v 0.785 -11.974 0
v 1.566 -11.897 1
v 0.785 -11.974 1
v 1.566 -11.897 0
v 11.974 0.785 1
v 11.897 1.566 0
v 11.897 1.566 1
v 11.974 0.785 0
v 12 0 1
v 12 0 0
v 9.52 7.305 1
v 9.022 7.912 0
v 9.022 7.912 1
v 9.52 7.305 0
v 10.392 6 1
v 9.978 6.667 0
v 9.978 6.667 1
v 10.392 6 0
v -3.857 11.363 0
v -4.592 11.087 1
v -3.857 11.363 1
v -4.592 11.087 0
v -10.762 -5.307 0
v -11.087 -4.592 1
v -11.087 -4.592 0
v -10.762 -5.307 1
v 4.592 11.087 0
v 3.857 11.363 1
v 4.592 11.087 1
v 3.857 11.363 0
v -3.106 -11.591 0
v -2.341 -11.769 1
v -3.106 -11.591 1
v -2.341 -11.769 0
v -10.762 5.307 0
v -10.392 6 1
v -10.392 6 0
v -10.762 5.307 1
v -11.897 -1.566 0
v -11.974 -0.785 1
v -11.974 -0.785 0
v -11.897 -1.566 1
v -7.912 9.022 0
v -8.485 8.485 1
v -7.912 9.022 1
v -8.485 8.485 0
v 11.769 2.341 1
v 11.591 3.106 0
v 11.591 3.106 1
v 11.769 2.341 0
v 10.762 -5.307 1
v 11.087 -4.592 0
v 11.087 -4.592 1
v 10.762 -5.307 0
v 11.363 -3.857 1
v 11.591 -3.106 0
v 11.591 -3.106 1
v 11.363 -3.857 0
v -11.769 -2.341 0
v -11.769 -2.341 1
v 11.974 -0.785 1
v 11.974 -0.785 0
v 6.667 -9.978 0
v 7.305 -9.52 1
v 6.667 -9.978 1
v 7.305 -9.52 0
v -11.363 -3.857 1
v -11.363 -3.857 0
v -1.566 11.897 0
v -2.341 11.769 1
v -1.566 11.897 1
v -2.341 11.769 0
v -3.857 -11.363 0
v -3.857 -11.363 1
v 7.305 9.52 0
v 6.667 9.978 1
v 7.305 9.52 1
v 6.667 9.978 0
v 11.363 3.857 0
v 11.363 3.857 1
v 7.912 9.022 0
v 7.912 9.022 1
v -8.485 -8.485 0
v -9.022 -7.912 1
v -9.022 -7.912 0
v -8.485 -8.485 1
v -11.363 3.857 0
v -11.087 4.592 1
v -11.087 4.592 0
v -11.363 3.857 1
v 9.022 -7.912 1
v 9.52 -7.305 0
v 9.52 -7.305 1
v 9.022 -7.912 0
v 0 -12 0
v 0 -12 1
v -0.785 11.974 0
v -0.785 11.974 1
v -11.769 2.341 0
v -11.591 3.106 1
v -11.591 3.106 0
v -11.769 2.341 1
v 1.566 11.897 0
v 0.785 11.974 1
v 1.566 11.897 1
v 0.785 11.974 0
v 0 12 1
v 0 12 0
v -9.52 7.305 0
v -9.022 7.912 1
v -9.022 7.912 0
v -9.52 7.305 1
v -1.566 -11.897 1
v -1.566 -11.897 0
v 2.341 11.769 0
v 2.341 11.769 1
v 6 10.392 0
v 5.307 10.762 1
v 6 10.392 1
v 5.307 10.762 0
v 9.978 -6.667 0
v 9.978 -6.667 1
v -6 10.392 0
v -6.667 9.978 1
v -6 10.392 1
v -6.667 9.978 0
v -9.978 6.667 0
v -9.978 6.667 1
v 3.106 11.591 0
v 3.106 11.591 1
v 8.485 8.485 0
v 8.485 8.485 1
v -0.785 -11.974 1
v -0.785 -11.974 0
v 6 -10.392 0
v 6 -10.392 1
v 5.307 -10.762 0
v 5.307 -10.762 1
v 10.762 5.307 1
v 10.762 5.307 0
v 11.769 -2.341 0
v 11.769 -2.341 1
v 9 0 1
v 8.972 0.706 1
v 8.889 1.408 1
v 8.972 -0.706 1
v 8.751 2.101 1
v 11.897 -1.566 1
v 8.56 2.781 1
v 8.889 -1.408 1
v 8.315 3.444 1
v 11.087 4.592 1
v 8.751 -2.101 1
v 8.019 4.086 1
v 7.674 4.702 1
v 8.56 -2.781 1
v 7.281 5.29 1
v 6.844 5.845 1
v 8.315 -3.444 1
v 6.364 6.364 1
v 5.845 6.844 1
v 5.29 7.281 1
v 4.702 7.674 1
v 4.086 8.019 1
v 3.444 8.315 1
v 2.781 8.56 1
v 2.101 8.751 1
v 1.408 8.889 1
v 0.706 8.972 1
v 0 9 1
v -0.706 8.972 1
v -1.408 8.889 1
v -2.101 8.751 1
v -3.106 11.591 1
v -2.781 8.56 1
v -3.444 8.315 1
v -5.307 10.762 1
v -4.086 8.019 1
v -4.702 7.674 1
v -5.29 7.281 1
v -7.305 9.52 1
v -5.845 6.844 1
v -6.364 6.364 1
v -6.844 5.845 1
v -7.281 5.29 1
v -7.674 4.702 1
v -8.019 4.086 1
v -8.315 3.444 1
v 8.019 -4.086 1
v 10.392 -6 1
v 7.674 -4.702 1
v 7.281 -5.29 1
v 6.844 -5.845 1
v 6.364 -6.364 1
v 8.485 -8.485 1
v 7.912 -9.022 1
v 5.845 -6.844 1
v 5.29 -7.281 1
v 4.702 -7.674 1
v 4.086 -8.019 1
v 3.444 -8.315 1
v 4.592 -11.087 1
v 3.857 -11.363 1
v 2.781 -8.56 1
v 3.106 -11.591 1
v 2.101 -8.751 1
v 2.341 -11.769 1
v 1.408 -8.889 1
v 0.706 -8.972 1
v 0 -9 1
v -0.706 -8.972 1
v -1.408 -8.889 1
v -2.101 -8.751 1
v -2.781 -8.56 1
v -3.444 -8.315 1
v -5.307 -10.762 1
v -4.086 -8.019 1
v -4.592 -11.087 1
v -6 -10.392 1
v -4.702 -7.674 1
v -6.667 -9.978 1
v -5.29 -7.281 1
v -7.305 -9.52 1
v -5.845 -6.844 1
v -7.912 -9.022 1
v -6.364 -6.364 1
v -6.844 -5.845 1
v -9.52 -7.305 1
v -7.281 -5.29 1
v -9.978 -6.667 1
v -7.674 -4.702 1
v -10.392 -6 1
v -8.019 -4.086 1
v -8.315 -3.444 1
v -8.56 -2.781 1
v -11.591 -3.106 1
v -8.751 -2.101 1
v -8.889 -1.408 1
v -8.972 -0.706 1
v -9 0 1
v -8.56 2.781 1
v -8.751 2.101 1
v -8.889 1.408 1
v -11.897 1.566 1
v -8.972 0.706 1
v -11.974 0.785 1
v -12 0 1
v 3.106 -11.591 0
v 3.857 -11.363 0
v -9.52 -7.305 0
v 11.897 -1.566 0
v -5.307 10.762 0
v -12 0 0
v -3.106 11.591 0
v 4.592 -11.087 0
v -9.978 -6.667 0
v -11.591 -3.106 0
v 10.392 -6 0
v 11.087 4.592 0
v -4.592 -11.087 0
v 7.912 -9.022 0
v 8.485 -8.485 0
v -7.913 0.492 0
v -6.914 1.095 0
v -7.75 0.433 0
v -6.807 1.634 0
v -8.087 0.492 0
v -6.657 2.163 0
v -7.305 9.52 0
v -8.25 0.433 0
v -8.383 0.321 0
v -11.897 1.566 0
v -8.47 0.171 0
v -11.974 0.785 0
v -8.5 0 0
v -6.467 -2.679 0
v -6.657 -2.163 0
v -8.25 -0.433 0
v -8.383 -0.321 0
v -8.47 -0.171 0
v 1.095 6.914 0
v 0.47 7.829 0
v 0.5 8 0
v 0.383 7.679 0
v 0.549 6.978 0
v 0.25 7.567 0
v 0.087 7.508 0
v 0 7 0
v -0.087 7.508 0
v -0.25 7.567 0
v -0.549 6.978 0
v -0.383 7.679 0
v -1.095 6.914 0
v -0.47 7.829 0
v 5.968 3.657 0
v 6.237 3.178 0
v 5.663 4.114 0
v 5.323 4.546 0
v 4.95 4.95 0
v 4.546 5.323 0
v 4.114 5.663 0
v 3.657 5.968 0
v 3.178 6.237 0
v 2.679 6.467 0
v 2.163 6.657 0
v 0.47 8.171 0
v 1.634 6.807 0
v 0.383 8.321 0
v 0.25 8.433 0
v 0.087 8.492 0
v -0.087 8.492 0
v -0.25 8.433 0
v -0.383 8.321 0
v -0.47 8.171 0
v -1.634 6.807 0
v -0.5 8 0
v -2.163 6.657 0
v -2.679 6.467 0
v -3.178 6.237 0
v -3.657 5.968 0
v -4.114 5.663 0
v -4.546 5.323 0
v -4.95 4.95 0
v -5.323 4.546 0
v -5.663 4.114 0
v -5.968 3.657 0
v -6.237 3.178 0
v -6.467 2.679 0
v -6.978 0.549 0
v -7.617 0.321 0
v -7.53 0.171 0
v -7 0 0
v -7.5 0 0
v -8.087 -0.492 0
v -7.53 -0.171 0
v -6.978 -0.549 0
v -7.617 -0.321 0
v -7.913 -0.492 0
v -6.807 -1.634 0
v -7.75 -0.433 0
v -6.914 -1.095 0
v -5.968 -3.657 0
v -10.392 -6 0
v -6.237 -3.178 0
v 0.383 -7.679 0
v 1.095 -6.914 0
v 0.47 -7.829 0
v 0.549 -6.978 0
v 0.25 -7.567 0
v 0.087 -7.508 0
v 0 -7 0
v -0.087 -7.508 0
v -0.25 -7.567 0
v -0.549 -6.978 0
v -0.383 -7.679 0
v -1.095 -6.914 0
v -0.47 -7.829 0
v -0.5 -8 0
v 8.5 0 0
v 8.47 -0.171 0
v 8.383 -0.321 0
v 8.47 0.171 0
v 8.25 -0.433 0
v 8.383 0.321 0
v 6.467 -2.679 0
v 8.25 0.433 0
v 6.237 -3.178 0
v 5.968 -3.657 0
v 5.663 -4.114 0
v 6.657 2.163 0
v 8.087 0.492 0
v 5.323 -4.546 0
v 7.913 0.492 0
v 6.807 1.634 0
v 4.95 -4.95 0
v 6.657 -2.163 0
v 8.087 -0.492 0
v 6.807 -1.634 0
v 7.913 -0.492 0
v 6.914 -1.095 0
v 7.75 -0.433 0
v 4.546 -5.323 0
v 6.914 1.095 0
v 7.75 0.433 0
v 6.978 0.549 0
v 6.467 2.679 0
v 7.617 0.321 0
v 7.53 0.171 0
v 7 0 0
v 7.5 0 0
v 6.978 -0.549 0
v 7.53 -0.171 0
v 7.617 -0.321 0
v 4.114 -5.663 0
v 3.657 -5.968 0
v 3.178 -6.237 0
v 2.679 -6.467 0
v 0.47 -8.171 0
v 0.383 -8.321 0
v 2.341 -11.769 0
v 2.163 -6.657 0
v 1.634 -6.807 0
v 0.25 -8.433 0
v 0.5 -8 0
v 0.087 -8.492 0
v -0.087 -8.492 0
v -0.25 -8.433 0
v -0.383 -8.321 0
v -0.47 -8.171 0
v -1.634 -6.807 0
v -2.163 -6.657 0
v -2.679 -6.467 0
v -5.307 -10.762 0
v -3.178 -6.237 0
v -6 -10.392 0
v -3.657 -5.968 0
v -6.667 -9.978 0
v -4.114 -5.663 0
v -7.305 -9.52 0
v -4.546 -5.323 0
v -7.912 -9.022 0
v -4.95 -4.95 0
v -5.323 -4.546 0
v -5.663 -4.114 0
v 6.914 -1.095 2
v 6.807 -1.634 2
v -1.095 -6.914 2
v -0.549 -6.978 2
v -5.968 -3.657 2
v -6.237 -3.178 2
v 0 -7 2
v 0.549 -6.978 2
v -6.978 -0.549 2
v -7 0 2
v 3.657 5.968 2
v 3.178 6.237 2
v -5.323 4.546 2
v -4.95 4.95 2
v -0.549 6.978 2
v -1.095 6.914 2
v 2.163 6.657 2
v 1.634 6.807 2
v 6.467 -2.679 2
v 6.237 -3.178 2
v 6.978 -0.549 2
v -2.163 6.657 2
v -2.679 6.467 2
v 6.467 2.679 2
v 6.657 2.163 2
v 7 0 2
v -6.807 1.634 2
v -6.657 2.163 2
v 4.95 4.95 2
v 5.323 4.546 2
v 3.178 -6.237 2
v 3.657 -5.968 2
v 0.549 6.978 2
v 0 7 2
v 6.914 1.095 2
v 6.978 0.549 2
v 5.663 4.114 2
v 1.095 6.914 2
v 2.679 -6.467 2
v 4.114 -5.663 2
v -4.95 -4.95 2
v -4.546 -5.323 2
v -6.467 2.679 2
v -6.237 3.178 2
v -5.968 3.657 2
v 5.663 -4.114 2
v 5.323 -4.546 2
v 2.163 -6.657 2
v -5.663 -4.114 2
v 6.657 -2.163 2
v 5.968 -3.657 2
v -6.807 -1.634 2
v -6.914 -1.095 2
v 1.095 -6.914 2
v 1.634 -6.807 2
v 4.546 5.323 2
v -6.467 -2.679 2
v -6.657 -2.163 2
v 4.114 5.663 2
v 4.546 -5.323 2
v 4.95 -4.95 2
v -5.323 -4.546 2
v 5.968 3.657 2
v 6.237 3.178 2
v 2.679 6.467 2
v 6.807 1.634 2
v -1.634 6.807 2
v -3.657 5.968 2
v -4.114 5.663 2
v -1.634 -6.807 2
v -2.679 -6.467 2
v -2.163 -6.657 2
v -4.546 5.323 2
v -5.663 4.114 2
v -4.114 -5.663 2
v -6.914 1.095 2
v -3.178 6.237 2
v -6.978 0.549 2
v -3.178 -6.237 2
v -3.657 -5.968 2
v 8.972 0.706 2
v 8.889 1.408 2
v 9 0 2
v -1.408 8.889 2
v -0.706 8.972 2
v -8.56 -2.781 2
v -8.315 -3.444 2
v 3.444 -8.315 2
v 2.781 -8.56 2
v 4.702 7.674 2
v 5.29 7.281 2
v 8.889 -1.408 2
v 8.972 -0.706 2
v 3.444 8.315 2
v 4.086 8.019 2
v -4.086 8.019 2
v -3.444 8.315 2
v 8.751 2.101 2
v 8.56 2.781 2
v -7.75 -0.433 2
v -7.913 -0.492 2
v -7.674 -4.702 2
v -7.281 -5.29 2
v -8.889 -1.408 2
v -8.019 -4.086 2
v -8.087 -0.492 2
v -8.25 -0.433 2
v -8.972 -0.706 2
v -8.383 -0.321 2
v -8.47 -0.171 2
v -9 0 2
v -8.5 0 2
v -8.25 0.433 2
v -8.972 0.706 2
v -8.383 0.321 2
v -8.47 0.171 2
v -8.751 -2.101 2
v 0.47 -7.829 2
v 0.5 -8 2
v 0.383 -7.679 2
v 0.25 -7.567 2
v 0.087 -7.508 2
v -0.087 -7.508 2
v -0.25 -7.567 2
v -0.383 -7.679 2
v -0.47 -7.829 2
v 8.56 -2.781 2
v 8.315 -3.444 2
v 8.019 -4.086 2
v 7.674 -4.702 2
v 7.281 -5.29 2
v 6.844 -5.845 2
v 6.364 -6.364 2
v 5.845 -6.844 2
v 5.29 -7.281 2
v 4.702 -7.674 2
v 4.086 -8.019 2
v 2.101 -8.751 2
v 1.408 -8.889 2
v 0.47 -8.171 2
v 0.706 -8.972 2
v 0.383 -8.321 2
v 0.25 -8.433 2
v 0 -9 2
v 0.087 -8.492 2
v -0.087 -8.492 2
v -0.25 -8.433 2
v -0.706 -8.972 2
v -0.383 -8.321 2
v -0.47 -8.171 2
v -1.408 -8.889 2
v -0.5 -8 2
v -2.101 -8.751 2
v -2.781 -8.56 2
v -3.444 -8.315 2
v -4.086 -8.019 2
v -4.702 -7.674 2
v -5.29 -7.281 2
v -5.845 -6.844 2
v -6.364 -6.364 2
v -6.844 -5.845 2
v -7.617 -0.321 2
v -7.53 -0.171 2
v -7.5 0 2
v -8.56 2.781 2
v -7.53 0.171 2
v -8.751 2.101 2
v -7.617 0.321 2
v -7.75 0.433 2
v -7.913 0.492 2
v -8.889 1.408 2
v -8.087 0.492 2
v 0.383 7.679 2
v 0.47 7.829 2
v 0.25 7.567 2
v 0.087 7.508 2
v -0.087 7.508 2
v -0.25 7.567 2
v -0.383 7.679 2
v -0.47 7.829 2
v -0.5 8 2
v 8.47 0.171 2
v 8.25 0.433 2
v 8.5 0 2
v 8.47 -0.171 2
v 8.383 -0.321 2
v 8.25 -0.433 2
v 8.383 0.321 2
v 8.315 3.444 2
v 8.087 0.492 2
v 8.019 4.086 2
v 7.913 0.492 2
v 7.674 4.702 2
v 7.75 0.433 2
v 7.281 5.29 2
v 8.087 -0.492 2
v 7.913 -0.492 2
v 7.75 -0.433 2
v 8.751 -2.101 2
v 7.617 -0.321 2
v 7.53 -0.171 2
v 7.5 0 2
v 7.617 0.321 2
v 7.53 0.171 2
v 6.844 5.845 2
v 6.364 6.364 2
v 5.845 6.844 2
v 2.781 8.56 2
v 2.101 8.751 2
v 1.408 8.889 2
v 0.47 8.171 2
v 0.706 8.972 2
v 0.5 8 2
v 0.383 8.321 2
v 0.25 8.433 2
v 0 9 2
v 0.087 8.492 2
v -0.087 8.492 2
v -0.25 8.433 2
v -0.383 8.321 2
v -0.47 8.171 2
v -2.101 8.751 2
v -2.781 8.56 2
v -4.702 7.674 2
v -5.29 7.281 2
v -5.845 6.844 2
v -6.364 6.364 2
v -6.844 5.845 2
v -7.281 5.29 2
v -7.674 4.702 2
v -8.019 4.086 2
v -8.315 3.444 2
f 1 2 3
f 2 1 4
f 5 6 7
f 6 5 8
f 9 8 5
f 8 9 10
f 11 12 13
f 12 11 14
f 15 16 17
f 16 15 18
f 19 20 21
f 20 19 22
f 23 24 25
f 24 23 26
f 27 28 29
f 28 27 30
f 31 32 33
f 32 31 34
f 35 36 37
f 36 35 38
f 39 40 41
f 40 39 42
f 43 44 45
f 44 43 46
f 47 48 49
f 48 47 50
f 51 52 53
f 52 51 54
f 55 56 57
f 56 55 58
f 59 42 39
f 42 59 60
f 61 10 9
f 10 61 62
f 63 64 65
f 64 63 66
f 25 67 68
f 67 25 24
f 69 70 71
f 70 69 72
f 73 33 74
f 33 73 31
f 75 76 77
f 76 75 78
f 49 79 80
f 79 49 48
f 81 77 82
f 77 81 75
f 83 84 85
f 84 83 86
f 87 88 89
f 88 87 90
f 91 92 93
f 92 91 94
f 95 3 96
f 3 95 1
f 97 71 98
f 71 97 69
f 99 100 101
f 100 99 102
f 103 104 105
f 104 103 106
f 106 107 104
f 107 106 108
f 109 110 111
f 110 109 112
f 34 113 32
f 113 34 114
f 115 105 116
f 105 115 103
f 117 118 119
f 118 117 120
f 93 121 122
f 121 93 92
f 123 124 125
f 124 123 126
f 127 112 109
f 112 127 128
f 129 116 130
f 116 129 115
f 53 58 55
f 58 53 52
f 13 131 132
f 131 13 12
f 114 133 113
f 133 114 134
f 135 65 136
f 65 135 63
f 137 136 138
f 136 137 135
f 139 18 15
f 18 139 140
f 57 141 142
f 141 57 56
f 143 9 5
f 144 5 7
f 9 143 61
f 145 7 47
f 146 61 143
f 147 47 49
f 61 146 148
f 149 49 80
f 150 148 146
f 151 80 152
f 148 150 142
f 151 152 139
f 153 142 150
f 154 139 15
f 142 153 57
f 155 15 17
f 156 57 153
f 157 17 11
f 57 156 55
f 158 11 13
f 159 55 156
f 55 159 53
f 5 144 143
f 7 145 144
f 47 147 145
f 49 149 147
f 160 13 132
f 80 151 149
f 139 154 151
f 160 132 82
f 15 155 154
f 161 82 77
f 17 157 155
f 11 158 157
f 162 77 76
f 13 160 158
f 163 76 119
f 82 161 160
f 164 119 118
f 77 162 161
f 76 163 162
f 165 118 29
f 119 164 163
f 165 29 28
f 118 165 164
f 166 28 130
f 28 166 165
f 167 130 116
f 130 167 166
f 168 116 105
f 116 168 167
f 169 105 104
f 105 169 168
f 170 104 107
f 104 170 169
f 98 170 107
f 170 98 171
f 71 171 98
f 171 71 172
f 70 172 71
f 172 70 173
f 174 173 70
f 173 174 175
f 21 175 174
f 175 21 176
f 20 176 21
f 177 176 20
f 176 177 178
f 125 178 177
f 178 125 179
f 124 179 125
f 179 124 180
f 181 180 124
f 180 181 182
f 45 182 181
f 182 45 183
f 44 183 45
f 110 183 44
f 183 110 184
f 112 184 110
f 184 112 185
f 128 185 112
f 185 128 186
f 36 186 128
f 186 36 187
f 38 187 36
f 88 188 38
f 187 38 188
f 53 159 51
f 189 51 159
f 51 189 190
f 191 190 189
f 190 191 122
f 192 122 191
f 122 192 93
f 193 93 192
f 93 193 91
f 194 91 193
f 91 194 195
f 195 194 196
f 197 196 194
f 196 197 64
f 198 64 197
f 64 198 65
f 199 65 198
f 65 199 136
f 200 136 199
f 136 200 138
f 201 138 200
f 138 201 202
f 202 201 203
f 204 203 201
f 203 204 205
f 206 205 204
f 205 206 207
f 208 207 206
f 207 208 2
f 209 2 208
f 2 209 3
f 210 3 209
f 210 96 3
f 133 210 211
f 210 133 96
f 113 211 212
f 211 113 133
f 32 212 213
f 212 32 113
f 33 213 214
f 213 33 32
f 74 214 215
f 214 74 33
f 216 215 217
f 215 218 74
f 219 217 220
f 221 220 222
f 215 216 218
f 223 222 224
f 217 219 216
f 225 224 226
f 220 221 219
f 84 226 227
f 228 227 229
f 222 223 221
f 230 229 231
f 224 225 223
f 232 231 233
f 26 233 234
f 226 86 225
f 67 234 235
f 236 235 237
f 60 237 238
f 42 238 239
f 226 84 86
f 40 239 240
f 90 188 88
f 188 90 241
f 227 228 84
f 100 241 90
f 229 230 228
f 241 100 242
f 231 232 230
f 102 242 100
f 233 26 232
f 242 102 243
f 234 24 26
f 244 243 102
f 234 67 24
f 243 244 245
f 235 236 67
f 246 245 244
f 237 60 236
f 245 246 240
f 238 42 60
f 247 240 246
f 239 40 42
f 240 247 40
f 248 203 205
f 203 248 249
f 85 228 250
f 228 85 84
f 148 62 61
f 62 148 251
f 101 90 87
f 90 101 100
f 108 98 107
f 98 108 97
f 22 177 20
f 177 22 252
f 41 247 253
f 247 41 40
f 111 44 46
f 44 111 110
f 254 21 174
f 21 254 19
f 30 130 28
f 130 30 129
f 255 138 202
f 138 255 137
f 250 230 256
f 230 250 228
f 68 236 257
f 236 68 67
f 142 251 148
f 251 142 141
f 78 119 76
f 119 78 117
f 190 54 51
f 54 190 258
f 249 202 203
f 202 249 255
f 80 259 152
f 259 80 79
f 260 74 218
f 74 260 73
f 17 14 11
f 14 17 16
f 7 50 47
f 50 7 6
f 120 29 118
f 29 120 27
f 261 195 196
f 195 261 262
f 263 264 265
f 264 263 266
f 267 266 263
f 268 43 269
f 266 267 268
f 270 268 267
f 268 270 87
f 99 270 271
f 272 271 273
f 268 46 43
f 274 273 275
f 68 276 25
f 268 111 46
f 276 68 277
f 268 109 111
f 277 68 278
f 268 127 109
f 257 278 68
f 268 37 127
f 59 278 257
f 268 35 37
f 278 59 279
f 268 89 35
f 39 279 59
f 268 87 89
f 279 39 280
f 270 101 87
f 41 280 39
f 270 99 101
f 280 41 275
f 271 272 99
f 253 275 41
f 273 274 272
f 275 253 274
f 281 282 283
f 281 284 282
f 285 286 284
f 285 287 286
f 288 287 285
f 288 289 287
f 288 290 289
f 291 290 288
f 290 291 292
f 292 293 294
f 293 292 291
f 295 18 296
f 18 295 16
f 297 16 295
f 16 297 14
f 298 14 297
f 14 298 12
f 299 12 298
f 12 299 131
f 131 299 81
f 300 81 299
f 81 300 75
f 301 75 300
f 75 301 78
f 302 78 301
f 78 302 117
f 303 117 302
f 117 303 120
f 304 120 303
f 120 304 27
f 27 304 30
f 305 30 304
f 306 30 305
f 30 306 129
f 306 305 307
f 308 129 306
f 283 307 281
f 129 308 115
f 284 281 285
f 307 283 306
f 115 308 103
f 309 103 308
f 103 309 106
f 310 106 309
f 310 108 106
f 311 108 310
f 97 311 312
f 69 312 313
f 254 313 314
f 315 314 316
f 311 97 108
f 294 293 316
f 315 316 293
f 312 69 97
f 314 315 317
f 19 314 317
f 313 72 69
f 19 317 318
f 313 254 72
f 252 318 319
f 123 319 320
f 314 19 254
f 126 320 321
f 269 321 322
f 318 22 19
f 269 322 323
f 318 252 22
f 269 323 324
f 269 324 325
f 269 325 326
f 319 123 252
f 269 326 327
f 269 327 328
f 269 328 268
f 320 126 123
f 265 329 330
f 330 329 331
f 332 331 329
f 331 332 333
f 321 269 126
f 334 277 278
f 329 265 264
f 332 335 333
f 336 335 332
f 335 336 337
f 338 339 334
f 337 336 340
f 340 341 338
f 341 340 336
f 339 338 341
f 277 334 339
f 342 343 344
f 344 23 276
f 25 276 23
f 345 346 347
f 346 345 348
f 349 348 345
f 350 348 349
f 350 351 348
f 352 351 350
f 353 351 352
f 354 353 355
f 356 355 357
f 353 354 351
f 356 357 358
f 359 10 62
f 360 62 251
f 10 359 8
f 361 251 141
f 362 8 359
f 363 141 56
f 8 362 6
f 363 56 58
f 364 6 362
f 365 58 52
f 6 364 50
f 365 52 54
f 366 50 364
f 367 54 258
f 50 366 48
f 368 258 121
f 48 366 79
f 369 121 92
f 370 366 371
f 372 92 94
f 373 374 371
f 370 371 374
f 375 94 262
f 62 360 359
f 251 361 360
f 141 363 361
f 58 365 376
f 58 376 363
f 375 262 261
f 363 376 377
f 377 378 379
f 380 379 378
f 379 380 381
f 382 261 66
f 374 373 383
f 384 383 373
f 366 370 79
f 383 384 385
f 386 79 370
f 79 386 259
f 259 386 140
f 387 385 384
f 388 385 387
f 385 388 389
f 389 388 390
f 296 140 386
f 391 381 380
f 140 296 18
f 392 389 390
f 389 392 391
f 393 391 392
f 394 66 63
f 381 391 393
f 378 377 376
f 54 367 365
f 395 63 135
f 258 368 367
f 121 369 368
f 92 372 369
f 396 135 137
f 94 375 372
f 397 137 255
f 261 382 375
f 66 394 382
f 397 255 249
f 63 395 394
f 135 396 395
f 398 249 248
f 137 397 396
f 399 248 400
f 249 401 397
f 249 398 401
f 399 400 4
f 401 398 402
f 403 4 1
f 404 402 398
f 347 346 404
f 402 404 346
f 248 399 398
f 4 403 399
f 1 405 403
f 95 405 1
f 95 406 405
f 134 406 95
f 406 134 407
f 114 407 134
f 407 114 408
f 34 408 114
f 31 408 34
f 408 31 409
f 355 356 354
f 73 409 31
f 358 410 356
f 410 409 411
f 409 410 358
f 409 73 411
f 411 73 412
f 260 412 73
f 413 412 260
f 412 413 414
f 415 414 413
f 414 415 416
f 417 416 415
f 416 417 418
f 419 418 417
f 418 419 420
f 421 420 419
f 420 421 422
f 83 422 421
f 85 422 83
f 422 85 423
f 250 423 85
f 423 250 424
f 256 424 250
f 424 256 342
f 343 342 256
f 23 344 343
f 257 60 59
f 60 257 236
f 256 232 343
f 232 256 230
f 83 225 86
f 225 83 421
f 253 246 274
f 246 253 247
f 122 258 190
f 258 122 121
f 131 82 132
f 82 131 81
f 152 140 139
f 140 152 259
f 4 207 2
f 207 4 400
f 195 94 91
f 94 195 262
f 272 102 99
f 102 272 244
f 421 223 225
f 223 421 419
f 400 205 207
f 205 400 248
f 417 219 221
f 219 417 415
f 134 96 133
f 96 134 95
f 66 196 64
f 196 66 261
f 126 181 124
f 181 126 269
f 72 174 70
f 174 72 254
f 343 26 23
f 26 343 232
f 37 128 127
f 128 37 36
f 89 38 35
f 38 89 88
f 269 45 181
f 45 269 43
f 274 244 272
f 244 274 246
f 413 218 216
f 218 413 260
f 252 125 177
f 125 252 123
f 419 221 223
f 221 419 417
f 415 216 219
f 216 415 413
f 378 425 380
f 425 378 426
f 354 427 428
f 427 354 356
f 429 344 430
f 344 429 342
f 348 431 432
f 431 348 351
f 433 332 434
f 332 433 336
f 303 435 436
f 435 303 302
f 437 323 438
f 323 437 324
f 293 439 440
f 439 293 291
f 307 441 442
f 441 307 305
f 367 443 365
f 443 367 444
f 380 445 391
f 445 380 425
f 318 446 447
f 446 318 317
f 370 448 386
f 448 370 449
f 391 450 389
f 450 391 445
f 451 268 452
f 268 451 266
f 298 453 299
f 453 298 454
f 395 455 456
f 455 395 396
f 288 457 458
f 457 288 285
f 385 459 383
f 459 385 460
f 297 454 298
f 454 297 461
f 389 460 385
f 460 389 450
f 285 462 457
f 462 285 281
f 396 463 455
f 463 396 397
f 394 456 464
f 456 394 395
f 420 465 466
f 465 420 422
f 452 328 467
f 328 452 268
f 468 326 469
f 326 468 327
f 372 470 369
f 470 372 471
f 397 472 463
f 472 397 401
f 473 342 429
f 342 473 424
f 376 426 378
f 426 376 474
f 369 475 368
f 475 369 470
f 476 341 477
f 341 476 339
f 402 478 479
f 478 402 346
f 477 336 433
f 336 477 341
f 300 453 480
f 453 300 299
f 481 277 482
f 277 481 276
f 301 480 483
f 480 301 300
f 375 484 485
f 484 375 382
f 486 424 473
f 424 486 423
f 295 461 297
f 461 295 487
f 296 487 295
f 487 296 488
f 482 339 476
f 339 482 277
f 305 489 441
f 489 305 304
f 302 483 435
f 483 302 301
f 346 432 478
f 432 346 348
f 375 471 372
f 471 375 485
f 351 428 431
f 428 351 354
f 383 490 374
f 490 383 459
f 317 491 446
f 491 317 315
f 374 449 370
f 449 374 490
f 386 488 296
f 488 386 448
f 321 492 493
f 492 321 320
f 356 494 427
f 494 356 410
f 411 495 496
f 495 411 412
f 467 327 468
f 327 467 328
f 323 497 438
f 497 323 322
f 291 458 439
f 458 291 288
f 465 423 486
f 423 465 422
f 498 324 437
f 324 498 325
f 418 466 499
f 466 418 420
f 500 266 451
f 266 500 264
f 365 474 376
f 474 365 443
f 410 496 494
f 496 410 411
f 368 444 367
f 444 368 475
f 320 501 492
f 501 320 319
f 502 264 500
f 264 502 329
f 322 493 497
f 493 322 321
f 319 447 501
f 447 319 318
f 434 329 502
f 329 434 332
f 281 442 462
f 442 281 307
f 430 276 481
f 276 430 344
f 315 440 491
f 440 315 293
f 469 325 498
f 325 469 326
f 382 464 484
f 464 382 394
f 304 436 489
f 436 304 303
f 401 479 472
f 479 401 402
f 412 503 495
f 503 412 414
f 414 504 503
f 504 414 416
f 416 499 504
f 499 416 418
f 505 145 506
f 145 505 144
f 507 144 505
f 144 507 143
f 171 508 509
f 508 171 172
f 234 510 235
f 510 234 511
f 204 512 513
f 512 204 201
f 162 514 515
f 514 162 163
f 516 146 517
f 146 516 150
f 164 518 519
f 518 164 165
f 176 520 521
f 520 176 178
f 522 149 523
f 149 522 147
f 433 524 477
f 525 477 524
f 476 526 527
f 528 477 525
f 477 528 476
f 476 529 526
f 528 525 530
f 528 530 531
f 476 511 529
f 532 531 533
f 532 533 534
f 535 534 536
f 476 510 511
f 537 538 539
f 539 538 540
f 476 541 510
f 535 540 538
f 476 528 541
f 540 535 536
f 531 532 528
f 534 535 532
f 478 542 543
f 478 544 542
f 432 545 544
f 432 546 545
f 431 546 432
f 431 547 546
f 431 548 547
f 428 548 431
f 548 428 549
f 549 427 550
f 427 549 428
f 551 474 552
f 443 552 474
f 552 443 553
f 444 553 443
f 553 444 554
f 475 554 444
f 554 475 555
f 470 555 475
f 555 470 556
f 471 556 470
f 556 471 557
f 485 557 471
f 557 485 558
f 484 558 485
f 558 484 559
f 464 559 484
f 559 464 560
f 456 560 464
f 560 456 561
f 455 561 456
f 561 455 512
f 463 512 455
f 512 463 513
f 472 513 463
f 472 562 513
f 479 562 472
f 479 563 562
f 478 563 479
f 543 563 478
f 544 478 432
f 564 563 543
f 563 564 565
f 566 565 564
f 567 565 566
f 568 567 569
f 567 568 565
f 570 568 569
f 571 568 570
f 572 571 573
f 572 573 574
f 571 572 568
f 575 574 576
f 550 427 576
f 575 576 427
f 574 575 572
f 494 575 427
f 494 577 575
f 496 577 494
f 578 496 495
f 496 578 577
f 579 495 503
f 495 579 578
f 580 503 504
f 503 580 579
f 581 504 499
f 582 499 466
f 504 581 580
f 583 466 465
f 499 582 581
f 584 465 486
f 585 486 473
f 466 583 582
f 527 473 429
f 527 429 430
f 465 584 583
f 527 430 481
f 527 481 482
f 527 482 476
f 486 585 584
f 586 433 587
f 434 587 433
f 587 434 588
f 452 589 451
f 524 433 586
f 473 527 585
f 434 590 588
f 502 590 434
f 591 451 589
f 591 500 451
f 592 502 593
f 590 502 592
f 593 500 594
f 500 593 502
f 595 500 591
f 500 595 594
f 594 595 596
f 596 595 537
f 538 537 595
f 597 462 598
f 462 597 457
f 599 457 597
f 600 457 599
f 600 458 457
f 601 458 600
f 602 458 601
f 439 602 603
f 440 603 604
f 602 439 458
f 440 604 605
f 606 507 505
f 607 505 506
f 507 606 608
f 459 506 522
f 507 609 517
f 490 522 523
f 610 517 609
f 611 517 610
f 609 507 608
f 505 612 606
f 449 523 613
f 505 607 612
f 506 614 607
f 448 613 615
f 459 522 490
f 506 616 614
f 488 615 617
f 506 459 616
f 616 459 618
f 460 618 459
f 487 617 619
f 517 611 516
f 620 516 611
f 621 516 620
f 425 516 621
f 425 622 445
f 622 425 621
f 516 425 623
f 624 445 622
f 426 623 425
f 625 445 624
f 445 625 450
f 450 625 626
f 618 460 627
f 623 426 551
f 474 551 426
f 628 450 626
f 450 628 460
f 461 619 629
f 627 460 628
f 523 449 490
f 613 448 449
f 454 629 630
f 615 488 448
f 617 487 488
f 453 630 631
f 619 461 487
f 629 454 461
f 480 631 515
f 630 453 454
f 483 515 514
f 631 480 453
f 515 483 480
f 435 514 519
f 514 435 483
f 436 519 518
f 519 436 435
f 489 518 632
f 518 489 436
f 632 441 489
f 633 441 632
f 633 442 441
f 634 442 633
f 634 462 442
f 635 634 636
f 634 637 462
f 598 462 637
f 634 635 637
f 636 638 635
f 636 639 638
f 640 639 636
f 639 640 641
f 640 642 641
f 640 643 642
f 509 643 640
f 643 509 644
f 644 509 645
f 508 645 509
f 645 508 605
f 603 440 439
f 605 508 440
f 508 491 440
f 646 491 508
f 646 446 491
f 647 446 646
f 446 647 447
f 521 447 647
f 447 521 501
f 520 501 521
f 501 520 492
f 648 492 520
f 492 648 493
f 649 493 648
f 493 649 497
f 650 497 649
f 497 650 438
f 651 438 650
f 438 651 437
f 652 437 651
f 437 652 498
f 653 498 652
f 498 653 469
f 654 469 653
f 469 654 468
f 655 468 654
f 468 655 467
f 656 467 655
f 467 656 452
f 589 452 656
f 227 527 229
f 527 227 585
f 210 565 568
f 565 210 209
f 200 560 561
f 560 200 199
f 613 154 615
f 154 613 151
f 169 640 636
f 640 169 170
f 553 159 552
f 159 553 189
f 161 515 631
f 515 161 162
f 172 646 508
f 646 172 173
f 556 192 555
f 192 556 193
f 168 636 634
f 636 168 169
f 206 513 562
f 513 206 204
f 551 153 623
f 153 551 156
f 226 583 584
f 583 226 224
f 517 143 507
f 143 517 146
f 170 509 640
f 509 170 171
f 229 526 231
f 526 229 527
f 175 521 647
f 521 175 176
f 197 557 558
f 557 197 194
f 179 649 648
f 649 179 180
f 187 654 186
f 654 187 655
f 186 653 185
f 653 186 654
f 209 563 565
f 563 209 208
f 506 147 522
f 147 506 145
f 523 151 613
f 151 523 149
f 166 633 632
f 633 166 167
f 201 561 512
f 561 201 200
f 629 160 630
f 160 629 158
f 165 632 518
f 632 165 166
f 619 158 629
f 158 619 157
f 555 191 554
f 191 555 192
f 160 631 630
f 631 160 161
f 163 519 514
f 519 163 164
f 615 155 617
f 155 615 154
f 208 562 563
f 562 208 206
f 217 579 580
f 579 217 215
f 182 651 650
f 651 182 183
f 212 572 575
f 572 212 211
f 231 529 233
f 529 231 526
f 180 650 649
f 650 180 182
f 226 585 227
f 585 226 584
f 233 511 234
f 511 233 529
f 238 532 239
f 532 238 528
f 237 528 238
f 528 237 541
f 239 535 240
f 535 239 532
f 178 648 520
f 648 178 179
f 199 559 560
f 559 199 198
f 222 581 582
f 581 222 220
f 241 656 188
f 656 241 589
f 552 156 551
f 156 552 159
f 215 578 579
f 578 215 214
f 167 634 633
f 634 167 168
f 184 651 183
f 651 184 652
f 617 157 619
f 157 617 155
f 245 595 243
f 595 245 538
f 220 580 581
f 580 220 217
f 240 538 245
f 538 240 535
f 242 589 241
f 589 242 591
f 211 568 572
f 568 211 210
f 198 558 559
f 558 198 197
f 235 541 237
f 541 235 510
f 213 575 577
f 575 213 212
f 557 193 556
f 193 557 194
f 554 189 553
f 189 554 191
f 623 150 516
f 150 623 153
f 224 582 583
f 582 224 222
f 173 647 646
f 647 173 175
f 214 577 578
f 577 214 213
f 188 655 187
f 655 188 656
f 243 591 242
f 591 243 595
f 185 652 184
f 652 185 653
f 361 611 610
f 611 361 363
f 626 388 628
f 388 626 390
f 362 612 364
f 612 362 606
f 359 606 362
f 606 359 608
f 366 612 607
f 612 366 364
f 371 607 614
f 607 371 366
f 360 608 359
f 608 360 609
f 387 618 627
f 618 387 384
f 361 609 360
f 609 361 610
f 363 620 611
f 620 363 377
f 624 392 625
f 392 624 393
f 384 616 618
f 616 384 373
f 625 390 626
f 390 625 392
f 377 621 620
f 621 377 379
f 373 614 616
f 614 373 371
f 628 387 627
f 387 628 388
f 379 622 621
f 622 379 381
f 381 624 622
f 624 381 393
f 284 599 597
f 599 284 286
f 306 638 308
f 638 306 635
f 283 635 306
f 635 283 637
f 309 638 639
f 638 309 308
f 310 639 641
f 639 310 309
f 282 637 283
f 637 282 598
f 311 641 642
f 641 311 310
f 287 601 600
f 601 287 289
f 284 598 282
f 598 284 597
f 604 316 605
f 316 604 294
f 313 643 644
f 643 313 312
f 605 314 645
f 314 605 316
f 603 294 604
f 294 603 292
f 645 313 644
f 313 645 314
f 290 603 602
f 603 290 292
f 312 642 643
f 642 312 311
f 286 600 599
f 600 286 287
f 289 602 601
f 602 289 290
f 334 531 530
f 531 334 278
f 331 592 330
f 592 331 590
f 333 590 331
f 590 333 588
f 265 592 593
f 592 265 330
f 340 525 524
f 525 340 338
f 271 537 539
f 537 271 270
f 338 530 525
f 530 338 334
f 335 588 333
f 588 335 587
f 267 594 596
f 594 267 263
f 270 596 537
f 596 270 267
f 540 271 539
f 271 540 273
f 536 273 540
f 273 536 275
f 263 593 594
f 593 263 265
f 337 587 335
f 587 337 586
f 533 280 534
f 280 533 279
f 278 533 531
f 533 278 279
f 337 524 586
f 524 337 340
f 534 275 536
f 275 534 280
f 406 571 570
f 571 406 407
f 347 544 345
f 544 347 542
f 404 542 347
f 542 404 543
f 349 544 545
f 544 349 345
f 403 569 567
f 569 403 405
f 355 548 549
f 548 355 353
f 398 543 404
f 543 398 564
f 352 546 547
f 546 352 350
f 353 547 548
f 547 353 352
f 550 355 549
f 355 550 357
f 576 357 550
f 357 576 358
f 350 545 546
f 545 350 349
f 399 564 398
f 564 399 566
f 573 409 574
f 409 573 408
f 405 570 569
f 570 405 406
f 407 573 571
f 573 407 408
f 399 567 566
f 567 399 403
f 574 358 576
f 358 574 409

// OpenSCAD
// part_id: mar17
// name: Mars pointer ring outer
// source_drawing_ids: DRW-013
// units: mm
// revision: 0.1
// SPDX-License-Identifier: MIT

module part_mar17(
    outer_d = 24.0,
    inner_d = 14.0,
    shoulder_d = 18.0,
    base_h = 1.0,
    shoulder_h = 1.0,
    rivet_d = 1.0,
    rivet_pcd = 16.0,
    rivet_count = 4
) {
    difference() {
        union() {
            difference() {
                cylinder(d = outer_d, h = base_h, $fn = 96);
                translate([0, 0, -0.05]) cylinder(d = inner_d, h = base_h + 0.1, $fn = 80);
            }
            translate([0, 0, base_h])
                difference() {
                    cylinder(d = shoulder_d, h = shoulder_h, $fn = 80);
                    translate([0, 0, -0.05]) cylinder(d = inner_d, h = shoulder_h + 0.1, $fn = 80);
                }
        }
        for (i = [0 : rivet_count - 1]) {
            a = i * 360 / rivet_count;
            translate([(rivet_pcd / 2) * cos(a), (rivet_pcd / 2) * sin(a), -0.1])
                cylinder(d = rivet_d, h = base_h + shoulder_h + 0.2, $fn = 18);
        }
    }
}

// ---- "main guard" ----
if (is_undef(__LIB_MODE__)) {
    part_mar17();
}
